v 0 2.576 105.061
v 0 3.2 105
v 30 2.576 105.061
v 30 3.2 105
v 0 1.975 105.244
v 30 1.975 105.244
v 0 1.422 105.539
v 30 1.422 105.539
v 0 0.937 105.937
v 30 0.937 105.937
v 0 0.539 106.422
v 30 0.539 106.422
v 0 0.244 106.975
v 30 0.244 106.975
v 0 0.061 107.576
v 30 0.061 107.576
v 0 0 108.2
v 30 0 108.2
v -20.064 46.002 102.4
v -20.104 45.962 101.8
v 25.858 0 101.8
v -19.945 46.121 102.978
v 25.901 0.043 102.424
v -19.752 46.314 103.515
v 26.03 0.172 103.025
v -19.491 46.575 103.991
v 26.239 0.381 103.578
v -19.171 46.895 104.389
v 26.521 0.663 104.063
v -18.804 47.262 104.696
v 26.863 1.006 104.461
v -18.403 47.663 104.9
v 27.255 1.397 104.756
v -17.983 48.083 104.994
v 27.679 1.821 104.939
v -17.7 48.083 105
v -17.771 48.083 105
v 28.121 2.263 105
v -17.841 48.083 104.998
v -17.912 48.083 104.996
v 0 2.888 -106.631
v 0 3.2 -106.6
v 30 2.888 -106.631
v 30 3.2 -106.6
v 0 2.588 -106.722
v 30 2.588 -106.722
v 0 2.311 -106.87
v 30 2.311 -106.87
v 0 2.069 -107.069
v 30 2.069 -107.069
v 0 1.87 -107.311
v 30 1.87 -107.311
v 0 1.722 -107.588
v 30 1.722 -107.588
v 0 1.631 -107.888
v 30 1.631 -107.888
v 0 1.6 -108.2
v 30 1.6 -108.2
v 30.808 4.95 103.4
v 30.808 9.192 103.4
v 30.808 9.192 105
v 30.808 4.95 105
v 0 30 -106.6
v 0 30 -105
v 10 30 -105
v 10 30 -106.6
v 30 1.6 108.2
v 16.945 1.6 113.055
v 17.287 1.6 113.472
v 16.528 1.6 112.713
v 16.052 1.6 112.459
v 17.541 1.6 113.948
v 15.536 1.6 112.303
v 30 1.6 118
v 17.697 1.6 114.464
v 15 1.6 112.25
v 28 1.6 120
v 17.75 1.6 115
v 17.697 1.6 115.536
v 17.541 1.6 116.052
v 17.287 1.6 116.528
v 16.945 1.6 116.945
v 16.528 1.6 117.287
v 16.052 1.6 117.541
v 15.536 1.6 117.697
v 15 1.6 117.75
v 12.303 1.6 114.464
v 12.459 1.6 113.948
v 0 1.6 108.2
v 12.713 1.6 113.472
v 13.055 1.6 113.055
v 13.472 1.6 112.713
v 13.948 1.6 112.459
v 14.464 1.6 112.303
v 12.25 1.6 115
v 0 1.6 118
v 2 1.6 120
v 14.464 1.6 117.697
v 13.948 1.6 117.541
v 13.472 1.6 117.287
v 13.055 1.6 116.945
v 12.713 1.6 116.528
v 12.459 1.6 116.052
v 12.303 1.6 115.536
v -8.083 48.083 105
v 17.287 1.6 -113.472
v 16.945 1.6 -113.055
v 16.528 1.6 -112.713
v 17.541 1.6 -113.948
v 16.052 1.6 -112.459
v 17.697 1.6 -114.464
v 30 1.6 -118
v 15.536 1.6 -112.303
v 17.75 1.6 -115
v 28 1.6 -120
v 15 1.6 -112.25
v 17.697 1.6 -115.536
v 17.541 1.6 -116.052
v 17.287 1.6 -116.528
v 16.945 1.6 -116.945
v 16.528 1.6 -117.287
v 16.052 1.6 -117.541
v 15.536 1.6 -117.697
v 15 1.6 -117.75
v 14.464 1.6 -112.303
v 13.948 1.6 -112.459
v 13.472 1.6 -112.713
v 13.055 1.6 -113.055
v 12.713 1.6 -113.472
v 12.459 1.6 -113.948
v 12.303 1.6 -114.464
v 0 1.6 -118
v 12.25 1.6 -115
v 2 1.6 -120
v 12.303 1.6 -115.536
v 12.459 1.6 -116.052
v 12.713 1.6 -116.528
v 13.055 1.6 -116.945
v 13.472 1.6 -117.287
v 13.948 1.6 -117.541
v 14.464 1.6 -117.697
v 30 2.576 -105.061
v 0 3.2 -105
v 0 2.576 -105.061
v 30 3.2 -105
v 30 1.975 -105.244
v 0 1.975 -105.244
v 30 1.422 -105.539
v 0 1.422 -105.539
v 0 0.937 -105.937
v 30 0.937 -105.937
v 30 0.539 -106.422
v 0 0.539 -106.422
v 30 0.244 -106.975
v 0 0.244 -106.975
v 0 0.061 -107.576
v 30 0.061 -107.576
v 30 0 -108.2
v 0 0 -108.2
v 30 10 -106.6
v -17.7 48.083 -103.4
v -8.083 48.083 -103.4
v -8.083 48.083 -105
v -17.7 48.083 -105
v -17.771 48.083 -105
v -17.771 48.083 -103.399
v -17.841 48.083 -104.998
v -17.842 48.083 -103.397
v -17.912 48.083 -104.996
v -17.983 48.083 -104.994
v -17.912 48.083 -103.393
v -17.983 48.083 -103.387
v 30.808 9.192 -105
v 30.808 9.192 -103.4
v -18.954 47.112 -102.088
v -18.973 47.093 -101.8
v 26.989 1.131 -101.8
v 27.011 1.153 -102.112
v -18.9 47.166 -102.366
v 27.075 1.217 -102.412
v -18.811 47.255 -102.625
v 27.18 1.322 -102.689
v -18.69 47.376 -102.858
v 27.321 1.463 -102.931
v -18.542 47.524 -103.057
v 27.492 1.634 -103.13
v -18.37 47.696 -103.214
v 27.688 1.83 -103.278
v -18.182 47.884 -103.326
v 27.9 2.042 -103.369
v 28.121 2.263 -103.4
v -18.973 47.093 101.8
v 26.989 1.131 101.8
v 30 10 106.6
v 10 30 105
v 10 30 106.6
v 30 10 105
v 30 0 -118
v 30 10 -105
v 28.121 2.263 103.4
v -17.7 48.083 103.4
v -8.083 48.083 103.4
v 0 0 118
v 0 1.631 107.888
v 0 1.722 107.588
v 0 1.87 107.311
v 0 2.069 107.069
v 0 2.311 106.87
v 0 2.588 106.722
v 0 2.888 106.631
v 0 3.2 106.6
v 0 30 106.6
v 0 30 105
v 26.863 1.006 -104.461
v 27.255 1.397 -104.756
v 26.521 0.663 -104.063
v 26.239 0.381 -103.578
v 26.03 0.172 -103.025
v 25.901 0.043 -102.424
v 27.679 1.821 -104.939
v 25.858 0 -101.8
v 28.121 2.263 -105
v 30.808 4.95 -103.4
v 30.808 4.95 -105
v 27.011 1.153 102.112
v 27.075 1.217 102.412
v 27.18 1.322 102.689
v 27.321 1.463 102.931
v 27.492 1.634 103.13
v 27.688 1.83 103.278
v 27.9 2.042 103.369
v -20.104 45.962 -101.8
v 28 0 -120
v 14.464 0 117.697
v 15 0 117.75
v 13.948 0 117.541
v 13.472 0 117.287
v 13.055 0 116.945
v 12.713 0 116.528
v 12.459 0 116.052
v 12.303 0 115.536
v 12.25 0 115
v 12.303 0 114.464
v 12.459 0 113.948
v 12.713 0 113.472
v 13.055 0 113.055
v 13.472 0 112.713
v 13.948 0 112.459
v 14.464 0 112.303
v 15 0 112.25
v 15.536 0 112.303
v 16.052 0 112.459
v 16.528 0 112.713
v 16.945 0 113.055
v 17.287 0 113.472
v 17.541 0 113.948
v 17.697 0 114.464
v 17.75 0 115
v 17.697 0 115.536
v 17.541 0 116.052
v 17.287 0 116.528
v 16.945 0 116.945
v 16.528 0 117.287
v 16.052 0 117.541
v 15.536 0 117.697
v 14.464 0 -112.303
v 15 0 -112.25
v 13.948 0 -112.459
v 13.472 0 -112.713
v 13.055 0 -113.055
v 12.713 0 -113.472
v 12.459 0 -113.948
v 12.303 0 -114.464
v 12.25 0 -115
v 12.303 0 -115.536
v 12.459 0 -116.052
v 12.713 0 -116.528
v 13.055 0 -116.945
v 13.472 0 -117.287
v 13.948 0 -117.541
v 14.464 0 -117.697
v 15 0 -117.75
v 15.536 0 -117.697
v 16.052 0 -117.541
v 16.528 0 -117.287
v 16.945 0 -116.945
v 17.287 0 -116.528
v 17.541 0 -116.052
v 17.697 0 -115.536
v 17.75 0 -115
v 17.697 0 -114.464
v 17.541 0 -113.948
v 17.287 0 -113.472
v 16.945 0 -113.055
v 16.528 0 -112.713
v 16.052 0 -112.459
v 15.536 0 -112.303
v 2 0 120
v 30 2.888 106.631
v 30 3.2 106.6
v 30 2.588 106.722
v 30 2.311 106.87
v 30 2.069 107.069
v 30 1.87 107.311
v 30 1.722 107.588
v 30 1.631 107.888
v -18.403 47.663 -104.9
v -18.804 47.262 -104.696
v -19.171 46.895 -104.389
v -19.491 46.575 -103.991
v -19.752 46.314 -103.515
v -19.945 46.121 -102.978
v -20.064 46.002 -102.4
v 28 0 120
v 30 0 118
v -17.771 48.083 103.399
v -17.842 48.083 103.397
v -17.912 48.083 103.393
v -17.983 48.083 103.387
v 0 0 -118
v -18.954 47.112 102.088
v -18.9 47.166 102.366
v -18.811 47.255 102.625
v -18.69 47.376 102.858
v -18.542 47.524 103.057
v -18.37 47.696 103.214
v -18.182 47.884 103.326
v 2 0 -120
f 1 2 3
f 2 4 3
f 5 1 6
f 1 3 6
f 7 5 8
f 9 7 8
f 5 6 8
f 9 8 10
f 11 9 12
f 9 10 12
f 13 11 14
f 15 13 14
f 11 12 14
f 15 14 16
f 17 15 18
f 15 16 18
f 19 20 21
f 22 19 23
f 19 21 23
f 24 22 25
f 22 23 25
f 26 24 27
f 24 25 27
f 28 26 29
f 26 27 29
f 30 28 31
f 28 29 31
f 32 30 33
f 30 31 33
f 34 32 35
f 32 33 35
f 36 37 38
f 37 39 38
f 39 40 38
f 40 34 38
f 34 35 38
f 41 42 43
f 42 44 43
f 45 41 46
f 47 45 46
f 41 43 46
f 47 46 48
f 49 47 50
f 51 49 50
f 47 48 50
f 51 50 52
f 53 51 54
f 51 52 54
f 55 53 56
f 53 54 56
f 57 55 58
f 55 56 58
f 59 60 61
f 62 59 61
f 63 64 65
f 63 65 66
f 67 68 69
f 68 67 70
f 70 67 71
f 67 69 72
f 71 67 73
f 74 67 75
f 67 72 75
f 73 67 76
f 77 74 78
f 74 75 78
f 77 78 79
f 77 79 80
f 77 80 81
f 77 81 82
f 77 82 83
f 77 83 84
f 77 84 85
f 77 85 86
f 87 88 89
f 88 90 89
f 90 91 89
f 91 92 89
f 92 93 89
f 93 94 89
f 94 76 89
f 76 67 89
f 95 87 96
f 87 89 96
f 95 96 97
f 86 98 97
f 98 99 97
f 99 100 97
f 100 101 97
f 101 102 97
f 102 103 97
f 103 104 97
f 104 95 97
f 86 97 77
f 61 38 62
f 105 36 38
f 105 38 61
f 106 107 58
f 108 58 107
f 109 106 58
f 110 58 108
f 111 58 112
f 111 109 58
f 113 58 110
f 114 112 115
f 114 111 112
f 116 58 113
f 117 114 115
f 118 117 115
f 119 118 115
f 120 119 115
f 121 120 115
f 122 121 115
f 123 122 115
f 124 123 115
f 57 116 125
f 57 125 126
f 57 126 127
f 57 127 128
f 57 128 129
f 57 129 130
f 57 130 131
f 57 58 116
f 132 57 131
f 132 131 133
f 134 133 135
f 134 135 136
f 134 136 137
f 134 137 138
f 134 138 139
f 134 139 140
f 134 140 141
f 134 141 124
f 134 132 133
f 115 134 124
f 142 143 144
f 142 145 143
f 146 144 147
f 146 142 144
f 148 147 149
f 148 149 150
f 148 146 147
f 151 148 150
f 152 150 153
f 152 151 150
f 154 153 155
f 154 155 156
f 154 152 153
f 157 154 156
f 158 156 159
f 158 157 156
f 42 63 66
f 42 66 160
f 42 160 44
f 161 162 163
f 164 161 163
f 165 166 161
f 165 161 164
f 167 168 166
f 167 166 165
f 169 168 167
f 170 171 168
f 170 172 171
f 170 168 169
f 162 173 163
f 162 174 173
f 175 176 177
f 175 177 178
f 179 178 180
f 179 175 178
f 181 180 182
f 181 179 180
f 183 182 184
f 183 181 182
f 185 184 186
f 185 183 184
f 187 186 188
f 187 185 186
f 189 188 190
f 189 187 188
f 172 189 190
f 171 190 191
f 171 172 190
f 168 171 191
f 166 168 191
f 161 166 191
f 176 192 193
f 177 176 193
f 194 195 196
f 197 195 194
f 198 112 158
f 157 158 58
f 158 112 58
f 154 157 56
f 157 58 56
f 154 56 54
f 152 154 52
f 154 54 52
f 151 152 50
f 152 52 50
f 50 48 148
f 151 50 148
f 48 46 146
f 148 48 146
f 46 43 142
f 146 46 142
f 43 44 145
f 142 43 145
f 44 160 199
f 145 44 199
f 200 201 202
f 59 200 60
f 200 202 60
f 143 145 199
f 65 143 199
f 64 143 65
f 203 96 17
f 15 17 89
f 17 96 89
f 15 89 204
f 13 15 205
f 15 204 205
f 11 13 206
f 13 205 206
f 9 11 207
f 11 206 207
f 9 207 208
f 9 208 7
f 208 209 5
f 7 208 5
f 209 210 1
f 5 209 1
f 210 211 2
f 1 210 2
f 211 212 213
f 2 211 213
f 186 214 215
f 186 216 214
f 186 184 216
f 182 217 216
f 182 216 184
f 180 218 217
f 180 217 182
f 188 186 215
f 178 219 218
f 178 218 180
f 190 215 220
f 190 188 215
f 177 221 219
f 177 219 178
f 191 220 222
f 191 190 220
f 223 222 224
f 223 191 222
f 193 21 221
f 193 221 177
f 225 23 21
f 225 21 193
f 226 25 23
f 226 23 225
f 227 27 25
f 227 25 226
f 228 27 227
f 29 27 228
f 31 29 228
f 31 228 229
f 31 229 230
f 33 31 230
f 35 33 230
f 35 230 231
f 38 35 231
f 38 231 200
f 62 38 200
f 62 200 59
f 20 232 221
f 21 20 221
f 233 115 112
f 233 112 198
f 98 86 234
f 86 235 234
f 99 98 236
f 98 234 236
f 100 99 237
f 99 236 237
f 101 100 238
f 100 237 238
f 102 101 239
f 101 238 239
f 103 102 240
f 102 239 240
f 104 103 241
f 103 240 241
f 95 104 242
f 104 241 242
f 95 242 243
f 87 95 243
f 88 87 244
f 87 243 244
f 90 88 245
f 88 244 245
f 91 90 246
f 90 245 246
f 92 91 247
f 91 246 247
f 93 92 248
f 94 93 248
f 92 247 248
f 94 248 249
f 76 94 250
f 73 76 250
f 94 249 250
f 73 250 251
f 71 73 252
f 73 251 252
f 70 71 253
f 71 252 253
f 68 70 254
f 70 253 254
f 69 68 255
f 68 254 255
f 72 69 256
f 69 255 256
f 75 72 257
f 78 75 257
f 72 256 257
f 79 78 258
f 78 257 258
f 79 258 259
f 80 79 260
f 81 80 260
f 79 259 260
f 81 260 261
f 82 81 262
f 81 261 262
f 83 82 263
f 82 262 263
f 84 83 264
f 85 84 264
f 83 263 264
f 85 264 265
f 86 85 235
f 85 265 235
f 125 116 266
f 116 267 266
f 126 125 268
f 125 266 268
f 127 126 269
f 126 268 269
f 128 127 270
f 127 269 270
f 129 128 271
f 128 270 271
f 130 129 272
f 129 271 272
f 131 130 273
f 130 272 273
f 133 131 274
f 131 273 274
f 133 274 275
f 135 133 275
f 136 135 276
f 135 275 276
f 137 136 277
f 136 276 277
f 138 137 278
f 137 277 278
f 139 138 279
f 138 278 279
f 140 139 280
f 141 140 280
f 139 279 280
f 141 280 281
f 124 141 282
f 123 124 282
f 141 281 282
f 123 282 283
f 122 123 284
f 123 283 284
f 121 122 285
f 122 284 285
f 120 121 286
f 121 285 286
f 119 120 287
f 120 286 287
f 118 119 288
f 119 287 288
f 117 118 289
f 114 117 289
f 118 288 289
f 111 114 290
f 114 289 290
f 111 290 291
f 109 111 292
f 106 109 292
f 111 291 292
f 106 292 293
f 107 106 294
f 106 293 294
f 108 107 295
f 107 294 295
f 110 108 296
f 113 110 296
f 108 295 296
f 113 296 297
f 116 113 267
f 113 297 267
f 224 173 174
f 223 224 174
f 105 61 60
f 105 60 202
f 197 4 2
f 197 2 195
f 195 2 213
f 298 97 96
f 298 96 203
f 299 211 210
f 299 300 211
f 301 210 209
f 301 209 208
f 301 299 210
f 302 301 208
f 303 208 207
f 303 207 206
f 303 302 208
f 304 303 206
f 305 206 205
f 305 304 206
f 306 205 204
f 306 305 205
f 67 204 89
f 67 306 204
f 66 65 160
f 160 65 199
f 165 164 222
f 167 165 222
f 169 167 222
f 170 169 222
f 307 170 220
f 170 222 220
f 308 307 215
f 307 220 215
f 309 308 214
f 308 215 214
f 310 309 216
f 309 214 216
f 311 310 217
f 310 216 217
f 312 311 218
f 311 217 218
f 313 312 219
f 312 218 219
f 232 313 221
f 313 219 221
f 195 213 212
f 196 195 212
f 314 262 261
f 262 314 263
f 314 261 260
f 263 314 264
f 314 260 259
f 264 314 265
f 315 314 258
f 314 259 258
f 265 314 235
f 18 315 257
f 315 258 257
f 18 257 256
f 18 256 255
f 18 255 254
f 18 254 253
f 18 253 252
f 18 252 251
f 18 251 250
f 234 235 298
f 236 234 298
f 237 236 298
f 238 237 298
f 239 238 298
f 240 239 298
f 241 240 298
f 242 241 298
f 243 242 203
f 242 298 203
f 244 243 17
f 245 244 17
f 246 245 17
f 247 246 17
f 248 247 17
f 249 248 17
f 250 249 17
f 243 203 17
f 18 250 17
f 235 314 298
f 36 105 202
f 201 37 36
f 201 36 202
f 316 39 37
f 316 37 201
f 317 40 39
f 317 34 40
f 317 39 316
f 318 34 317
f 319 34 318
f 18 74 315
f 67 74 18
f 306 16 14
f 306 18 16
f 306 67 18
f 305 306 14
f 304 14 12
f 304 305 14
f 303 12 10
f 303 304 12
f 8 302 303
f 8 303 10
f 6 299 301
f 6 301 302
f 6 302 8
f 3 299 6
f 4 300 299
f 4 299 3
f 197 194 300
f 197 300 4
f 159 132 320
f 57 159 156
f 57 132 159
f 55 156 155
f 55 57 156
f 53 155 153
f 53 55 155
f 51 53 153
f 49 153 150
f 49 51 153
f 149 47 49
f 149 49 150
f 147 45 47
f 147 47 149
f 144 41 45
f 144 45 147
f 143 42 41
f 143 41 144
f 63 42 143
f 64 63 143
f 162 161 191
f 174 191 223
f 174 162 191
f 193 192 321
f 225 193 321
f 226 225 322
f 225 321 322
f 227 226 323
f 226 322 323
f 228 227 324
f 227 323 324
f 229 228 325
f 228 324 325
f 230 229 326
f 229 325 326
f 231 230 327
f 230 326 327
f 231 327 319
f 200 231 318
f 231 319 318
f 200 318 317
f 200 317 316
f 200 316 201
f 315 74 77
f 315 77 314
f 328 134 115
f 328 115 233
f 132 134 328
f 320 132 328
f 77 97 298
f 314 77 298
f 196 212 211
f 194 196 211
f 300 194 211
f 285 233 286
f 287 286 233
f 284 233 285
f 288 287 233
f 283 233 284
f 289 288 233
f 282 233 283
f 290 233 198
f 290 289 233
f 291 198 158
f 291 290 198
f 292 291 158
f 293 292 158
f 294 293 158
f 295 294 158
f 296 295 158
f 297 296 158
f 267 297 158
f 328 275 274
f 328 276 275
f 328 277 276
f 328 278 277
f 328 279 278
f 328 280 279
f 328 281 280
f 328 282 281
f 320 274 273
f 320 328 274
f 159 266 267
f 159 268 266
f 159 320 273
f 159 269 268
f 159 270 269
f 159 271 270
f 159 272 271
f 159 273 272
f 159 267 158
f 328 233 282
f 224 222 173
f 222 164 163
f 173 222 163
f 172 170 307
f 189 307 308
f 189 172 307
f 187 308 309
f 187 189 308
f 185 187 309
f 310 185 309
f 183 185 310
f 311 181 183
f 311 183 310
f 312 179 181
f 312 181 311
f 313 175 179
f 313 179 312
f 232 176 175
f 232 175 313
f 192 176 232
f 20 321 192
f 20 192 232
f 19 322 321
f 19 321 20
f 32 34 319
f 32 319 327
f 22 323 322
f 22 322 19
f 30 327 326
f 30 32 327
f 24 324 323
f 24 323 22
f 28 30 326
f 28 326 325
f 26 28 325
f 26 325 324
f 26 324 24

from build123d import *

# Parameters (mm, degrees)
BOSS_EXTRUDE1_DEPTH           = 30
FILLET1_R                     = 1.6
FILLET2_R                     = 3.2
CUT_EXTRUDE1_DEPTH            = 120
CHAMFER1_SIZE                 = 2
CUT_EXTRUDE2_DEPTH            = 105
SHELL1_T                      = -1.6
FILLET3_R                     = 1.6
FILLET4_R                     = 3.2
CHAMFER2_SIZE                 = 7
CHAMFER3_SIZE                 = 3
SKETCH5_W                     = 2.75
SKETCH5_H                     = 1.6
M5_CLEARANCE_HOLE1_AT_2_COUNT = 2
M5_CLEARANCE_HOLE1_AT_2_PITCH = 230


with BuildPart() as part:
    # Sketch1 → Boss-Extrude1 (new body)
    with BuildSketch(Plane(origin=(0, 0, 0), x_dir=(0, 0, -1), z_dir=(1, 0, 0))):
        Polygon((-120, 0), (-105, 0), (-105, 30), (-106.6, 30), (-106.6, 1.6), (-120, 1.6), align=None)
    extrude(amount=BOSS_EXTRUDE1_DEPTH)

    # Fillet1
    fillet1_edges = [part.edges().sort_by_distance(p)[0] for p in [
        (15, 1.6, 106.6),
    ]]
    fillet(fillet1_edges, radius=FILLET1_R)

    # Fillet2
    fillet2_edges = [part.edges().sort_by_distance(p)[0] for p in [
        (15, 0, 105),
    ]]
    fillet(fillet2_edges, radius=FILLET2_R)

    # Sketch2 → Cut-Extrude1 (cut)
    with BuildSketch(Plane.XY):
        Polygon((10, 30), (33, 7), (33, 33), (10, 33), align=None)
    extrude(amount=CUT_EXTRUDE1_DEPTH, mode=Mode.SUBTRACT)

    # Chamfer1
    chamfer1_edges = [part.edges().sort_by_distance(p)[0] for p in [
        (30, 0.8, 120),
        (0, 0.8, 120),
    ]]
    chamfer(chamfer1_edges, length=CHAMFER1_SIZE)


with BuildPart() as body_2:
    # Sketch3 → Cut-Extrude2 (new, symmetric)
    with BuildSketch(Plane.XY):
        Polygon((-20.104076401, 45.961940777), (25.857864376, 0), (32.928932188, 7.071067812), (-13.033008589, 53.033008589), align=None)
    extrude(amount=CUT_EXTRUDE2_DEPTH, both=True)

    # Shell1
    shell1_openings = [body_2.faces().sort_by_distance(p)[0] for p in [
        (9.9479618, 30.0520382, 0),
        (29.393398282, 3.535533906, 0),
        (-16.568542495, 49.497474683, 0),
    ]]
    offset(amount=SHELL1_T, openings=shell1_openings, kind=Kind.INTERSECTION)

    # Fillet3
    fillet3_edges = [body_2.edges().sort_by_distance(p)[0] for p in [
        (4.008264838, 24.112341238, -103.4),
        (4.008264838, 24.112341238, 103.4),
    ]]
    fillet(fillet3_edges, radius=FILLET3_R)

    # Fillet4
    fillet4_edges = [body_2.edges().sort_by_distance(p)[0] for p in [
        (2.876893988, 22.980970389, -105),
        (2.876893988, 22.980970389, 105),
    ]]
    fillet(fillet4_edges, radius=FILLET4_R)

    # Chamfer2
    chamfer2_edges = [body_2.edges().sort_by_distance(p)[0] for p in [
        (-13.033008589, 53.033008589, -104.2),
        (-13.033008589, 53.033008589, 104.2),
    ]]
    chamfer(chamfer2_edges, length=CHAMFER2_SIZE)

    # Chamfer3
    chamfer3_edges = [body_2.edges().sort_by_distance(p)[0] for p in [
        (32.928932188, 7.071067812, -104.2),
        (32.928932188, 7.071067812, 104.2),
    ]]
    chamfer(chamfer3_edges, length=CHAMFER3_SIZE)


with BuildPart() as body_3:
    # MirrorSolid1: mirrored copy
    add(part.part.mirror(Plane.XY))


with BuildPart() as part_1:
    add(part.part)

    # Sketch5 → M5 Clearance Hole1 (revolve, cut)
    with BuildSketch(Plane(origin=(15, 1.6, 115), x_dir=(0, 0, 1), z_dir=(1, 0, 0))):
        with Locations((1.375, 0.8)):
            Rectangle(SKETCH5_W, SKETCH5_H)
    m5_clearance_hole1 = revolve(axis=Axis((15, 7.95, 115), (0, -1, 0)), mode=Mode.SUBTRACT)


with BuildPart() as body_3_1:
    add(body_3.part)

    # M5 Clearance Hole1 at 2: M5 Clearance Hole1 ×2
    with Locations(*[(0, 0, -i * M5_CLEARANCE_HOLE1_AT_2_PITCH) for i in range(1, M5_CLEARANCE_HOLE1_AT_2_COUNT)]):
        add(m5_clearance_hole1, mode=Mode.SUBTRACT)


solid = Compound([body_2.part, part_1.part, body_3_1.part])
